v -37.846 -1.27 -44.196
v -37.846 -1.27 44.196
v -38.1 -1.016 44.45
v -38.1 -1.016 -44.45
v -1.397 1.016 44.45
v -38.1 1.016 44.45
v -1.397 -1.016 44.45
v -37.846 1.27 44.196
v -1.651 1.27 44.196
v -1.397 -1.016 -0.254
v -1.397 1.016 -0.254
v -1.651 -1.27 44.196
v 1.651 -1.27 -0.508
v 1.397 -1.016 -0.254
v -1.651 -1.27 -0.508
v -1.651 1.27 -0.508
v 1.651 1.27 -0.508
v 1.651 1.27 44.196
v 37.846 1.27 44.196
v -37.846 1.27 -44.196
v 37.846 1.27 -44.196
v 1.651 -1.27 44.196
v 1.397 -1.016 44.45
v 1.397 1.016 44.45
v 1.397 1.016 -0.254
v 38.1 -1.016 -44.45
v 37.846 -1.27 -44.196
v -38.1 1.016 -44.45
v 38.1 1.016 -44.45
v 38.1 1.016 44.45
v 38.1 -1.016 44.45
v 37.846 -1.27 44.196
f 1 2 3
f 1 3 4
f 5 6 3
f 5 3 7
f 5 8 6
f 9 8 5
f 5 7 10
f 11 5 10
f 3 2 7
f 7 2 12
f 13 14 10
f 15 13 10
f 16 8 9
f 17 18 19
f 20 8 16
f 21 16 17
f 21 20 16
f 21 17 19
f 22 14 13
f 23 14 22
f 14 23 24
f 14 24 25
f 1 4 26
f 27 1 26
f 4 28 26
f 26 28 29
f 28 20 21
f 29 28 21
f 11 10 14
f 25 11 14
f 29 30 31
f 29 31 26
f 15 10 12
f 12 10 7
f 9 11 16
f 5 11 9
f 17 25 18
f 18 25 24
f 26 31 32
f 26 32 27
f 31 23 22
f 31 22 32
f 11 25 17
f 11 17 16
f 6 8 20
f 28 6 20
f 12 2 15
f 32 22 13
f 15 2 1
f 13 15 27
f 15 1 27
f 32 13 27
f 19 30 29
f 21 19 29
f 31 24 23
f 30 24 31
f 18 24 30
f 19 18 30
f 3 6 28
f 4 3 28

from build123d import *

# Parameters (mm, degrees)
SKETCH1_W                    = 76.2
SKETCH1_H                    = 88.9
BOSS_EXTRUDE1_DEPTH          = 1.27
CUT_EXTRUDE_THIN1_DEPTH      = 59.599181735
CUT_EXTRUDE_THIN1_DEPTH_BACK = 2.794
SKETCH3_W                    = 2.794
SKETCH3_H                    = 44.704
CHAMFER1_SIZE                = 0.254


with BuildPart() as part:
    # Sketch1 → Boss-Extrude1 (new, symmetric)
    with BuildSketch(Plane(origin=(0, 0, 0), x_dir=(1, 0, 0), z_dir=(0, 1, 0))):
        Rectangle(SKETCH1_W, SKETCH1_H)
    extrude(amount=BOSS_EXTRUDE1_DEPTH, both=True)

    # Sketch3 → Cut-Extrude-Thin1 (cut, two sides: drawn at the far end of the back side and taken through both)
    with BuildSketch(Plane(origin=(0, 1.27, 0), x_dir=(1, 0, 0), z_dir=(0, 1, 0)).offset(-CUT_EXTRUDE_THIN1_DEPTH_BACK)):
        with Locations((0, -22.098)):
            Rectangle(SKETCH3_W, SKETCH3_H)
    extrude(amount=CUT_EXTRUDE_THIN1_DEPTH + CUT_EXTRUDE_THIN1_DEPTH_BACK, mode=Mode.SUBTRACT)

    # Chamfer1
    chamfer1_edges = [part.edges().sort_by_distance(p)[0] for p in [
        (38.1, 1.27, 0),
        (19.7485, -1.27, 44.45),
        (0, -1.27, -0.254),
        (1.397, -1.27, 22.098),
        (-1.397, -1.27, 22.098),
        (0, 1.27, -44.45),
        (19.7485, 1.27, 44.45),
        (1.397, 1.27, 22.098),
        (0, 1.27, -0.254),
        (-1.397, 1.27, 22.098),
        (-38.1, 1.27, 0),
        (0, -1.27, -44.45),
        (38.1, -1.27, 0),
        (-19.7485, -1.27, 44.45),
        (-38.1, -1.27, 0),
        (-19.7485, 1.27, 44.45),
    ]]
    chamfer(chamfer1_edges, length=CHAMFER1_SIZE)


solid = part.part
